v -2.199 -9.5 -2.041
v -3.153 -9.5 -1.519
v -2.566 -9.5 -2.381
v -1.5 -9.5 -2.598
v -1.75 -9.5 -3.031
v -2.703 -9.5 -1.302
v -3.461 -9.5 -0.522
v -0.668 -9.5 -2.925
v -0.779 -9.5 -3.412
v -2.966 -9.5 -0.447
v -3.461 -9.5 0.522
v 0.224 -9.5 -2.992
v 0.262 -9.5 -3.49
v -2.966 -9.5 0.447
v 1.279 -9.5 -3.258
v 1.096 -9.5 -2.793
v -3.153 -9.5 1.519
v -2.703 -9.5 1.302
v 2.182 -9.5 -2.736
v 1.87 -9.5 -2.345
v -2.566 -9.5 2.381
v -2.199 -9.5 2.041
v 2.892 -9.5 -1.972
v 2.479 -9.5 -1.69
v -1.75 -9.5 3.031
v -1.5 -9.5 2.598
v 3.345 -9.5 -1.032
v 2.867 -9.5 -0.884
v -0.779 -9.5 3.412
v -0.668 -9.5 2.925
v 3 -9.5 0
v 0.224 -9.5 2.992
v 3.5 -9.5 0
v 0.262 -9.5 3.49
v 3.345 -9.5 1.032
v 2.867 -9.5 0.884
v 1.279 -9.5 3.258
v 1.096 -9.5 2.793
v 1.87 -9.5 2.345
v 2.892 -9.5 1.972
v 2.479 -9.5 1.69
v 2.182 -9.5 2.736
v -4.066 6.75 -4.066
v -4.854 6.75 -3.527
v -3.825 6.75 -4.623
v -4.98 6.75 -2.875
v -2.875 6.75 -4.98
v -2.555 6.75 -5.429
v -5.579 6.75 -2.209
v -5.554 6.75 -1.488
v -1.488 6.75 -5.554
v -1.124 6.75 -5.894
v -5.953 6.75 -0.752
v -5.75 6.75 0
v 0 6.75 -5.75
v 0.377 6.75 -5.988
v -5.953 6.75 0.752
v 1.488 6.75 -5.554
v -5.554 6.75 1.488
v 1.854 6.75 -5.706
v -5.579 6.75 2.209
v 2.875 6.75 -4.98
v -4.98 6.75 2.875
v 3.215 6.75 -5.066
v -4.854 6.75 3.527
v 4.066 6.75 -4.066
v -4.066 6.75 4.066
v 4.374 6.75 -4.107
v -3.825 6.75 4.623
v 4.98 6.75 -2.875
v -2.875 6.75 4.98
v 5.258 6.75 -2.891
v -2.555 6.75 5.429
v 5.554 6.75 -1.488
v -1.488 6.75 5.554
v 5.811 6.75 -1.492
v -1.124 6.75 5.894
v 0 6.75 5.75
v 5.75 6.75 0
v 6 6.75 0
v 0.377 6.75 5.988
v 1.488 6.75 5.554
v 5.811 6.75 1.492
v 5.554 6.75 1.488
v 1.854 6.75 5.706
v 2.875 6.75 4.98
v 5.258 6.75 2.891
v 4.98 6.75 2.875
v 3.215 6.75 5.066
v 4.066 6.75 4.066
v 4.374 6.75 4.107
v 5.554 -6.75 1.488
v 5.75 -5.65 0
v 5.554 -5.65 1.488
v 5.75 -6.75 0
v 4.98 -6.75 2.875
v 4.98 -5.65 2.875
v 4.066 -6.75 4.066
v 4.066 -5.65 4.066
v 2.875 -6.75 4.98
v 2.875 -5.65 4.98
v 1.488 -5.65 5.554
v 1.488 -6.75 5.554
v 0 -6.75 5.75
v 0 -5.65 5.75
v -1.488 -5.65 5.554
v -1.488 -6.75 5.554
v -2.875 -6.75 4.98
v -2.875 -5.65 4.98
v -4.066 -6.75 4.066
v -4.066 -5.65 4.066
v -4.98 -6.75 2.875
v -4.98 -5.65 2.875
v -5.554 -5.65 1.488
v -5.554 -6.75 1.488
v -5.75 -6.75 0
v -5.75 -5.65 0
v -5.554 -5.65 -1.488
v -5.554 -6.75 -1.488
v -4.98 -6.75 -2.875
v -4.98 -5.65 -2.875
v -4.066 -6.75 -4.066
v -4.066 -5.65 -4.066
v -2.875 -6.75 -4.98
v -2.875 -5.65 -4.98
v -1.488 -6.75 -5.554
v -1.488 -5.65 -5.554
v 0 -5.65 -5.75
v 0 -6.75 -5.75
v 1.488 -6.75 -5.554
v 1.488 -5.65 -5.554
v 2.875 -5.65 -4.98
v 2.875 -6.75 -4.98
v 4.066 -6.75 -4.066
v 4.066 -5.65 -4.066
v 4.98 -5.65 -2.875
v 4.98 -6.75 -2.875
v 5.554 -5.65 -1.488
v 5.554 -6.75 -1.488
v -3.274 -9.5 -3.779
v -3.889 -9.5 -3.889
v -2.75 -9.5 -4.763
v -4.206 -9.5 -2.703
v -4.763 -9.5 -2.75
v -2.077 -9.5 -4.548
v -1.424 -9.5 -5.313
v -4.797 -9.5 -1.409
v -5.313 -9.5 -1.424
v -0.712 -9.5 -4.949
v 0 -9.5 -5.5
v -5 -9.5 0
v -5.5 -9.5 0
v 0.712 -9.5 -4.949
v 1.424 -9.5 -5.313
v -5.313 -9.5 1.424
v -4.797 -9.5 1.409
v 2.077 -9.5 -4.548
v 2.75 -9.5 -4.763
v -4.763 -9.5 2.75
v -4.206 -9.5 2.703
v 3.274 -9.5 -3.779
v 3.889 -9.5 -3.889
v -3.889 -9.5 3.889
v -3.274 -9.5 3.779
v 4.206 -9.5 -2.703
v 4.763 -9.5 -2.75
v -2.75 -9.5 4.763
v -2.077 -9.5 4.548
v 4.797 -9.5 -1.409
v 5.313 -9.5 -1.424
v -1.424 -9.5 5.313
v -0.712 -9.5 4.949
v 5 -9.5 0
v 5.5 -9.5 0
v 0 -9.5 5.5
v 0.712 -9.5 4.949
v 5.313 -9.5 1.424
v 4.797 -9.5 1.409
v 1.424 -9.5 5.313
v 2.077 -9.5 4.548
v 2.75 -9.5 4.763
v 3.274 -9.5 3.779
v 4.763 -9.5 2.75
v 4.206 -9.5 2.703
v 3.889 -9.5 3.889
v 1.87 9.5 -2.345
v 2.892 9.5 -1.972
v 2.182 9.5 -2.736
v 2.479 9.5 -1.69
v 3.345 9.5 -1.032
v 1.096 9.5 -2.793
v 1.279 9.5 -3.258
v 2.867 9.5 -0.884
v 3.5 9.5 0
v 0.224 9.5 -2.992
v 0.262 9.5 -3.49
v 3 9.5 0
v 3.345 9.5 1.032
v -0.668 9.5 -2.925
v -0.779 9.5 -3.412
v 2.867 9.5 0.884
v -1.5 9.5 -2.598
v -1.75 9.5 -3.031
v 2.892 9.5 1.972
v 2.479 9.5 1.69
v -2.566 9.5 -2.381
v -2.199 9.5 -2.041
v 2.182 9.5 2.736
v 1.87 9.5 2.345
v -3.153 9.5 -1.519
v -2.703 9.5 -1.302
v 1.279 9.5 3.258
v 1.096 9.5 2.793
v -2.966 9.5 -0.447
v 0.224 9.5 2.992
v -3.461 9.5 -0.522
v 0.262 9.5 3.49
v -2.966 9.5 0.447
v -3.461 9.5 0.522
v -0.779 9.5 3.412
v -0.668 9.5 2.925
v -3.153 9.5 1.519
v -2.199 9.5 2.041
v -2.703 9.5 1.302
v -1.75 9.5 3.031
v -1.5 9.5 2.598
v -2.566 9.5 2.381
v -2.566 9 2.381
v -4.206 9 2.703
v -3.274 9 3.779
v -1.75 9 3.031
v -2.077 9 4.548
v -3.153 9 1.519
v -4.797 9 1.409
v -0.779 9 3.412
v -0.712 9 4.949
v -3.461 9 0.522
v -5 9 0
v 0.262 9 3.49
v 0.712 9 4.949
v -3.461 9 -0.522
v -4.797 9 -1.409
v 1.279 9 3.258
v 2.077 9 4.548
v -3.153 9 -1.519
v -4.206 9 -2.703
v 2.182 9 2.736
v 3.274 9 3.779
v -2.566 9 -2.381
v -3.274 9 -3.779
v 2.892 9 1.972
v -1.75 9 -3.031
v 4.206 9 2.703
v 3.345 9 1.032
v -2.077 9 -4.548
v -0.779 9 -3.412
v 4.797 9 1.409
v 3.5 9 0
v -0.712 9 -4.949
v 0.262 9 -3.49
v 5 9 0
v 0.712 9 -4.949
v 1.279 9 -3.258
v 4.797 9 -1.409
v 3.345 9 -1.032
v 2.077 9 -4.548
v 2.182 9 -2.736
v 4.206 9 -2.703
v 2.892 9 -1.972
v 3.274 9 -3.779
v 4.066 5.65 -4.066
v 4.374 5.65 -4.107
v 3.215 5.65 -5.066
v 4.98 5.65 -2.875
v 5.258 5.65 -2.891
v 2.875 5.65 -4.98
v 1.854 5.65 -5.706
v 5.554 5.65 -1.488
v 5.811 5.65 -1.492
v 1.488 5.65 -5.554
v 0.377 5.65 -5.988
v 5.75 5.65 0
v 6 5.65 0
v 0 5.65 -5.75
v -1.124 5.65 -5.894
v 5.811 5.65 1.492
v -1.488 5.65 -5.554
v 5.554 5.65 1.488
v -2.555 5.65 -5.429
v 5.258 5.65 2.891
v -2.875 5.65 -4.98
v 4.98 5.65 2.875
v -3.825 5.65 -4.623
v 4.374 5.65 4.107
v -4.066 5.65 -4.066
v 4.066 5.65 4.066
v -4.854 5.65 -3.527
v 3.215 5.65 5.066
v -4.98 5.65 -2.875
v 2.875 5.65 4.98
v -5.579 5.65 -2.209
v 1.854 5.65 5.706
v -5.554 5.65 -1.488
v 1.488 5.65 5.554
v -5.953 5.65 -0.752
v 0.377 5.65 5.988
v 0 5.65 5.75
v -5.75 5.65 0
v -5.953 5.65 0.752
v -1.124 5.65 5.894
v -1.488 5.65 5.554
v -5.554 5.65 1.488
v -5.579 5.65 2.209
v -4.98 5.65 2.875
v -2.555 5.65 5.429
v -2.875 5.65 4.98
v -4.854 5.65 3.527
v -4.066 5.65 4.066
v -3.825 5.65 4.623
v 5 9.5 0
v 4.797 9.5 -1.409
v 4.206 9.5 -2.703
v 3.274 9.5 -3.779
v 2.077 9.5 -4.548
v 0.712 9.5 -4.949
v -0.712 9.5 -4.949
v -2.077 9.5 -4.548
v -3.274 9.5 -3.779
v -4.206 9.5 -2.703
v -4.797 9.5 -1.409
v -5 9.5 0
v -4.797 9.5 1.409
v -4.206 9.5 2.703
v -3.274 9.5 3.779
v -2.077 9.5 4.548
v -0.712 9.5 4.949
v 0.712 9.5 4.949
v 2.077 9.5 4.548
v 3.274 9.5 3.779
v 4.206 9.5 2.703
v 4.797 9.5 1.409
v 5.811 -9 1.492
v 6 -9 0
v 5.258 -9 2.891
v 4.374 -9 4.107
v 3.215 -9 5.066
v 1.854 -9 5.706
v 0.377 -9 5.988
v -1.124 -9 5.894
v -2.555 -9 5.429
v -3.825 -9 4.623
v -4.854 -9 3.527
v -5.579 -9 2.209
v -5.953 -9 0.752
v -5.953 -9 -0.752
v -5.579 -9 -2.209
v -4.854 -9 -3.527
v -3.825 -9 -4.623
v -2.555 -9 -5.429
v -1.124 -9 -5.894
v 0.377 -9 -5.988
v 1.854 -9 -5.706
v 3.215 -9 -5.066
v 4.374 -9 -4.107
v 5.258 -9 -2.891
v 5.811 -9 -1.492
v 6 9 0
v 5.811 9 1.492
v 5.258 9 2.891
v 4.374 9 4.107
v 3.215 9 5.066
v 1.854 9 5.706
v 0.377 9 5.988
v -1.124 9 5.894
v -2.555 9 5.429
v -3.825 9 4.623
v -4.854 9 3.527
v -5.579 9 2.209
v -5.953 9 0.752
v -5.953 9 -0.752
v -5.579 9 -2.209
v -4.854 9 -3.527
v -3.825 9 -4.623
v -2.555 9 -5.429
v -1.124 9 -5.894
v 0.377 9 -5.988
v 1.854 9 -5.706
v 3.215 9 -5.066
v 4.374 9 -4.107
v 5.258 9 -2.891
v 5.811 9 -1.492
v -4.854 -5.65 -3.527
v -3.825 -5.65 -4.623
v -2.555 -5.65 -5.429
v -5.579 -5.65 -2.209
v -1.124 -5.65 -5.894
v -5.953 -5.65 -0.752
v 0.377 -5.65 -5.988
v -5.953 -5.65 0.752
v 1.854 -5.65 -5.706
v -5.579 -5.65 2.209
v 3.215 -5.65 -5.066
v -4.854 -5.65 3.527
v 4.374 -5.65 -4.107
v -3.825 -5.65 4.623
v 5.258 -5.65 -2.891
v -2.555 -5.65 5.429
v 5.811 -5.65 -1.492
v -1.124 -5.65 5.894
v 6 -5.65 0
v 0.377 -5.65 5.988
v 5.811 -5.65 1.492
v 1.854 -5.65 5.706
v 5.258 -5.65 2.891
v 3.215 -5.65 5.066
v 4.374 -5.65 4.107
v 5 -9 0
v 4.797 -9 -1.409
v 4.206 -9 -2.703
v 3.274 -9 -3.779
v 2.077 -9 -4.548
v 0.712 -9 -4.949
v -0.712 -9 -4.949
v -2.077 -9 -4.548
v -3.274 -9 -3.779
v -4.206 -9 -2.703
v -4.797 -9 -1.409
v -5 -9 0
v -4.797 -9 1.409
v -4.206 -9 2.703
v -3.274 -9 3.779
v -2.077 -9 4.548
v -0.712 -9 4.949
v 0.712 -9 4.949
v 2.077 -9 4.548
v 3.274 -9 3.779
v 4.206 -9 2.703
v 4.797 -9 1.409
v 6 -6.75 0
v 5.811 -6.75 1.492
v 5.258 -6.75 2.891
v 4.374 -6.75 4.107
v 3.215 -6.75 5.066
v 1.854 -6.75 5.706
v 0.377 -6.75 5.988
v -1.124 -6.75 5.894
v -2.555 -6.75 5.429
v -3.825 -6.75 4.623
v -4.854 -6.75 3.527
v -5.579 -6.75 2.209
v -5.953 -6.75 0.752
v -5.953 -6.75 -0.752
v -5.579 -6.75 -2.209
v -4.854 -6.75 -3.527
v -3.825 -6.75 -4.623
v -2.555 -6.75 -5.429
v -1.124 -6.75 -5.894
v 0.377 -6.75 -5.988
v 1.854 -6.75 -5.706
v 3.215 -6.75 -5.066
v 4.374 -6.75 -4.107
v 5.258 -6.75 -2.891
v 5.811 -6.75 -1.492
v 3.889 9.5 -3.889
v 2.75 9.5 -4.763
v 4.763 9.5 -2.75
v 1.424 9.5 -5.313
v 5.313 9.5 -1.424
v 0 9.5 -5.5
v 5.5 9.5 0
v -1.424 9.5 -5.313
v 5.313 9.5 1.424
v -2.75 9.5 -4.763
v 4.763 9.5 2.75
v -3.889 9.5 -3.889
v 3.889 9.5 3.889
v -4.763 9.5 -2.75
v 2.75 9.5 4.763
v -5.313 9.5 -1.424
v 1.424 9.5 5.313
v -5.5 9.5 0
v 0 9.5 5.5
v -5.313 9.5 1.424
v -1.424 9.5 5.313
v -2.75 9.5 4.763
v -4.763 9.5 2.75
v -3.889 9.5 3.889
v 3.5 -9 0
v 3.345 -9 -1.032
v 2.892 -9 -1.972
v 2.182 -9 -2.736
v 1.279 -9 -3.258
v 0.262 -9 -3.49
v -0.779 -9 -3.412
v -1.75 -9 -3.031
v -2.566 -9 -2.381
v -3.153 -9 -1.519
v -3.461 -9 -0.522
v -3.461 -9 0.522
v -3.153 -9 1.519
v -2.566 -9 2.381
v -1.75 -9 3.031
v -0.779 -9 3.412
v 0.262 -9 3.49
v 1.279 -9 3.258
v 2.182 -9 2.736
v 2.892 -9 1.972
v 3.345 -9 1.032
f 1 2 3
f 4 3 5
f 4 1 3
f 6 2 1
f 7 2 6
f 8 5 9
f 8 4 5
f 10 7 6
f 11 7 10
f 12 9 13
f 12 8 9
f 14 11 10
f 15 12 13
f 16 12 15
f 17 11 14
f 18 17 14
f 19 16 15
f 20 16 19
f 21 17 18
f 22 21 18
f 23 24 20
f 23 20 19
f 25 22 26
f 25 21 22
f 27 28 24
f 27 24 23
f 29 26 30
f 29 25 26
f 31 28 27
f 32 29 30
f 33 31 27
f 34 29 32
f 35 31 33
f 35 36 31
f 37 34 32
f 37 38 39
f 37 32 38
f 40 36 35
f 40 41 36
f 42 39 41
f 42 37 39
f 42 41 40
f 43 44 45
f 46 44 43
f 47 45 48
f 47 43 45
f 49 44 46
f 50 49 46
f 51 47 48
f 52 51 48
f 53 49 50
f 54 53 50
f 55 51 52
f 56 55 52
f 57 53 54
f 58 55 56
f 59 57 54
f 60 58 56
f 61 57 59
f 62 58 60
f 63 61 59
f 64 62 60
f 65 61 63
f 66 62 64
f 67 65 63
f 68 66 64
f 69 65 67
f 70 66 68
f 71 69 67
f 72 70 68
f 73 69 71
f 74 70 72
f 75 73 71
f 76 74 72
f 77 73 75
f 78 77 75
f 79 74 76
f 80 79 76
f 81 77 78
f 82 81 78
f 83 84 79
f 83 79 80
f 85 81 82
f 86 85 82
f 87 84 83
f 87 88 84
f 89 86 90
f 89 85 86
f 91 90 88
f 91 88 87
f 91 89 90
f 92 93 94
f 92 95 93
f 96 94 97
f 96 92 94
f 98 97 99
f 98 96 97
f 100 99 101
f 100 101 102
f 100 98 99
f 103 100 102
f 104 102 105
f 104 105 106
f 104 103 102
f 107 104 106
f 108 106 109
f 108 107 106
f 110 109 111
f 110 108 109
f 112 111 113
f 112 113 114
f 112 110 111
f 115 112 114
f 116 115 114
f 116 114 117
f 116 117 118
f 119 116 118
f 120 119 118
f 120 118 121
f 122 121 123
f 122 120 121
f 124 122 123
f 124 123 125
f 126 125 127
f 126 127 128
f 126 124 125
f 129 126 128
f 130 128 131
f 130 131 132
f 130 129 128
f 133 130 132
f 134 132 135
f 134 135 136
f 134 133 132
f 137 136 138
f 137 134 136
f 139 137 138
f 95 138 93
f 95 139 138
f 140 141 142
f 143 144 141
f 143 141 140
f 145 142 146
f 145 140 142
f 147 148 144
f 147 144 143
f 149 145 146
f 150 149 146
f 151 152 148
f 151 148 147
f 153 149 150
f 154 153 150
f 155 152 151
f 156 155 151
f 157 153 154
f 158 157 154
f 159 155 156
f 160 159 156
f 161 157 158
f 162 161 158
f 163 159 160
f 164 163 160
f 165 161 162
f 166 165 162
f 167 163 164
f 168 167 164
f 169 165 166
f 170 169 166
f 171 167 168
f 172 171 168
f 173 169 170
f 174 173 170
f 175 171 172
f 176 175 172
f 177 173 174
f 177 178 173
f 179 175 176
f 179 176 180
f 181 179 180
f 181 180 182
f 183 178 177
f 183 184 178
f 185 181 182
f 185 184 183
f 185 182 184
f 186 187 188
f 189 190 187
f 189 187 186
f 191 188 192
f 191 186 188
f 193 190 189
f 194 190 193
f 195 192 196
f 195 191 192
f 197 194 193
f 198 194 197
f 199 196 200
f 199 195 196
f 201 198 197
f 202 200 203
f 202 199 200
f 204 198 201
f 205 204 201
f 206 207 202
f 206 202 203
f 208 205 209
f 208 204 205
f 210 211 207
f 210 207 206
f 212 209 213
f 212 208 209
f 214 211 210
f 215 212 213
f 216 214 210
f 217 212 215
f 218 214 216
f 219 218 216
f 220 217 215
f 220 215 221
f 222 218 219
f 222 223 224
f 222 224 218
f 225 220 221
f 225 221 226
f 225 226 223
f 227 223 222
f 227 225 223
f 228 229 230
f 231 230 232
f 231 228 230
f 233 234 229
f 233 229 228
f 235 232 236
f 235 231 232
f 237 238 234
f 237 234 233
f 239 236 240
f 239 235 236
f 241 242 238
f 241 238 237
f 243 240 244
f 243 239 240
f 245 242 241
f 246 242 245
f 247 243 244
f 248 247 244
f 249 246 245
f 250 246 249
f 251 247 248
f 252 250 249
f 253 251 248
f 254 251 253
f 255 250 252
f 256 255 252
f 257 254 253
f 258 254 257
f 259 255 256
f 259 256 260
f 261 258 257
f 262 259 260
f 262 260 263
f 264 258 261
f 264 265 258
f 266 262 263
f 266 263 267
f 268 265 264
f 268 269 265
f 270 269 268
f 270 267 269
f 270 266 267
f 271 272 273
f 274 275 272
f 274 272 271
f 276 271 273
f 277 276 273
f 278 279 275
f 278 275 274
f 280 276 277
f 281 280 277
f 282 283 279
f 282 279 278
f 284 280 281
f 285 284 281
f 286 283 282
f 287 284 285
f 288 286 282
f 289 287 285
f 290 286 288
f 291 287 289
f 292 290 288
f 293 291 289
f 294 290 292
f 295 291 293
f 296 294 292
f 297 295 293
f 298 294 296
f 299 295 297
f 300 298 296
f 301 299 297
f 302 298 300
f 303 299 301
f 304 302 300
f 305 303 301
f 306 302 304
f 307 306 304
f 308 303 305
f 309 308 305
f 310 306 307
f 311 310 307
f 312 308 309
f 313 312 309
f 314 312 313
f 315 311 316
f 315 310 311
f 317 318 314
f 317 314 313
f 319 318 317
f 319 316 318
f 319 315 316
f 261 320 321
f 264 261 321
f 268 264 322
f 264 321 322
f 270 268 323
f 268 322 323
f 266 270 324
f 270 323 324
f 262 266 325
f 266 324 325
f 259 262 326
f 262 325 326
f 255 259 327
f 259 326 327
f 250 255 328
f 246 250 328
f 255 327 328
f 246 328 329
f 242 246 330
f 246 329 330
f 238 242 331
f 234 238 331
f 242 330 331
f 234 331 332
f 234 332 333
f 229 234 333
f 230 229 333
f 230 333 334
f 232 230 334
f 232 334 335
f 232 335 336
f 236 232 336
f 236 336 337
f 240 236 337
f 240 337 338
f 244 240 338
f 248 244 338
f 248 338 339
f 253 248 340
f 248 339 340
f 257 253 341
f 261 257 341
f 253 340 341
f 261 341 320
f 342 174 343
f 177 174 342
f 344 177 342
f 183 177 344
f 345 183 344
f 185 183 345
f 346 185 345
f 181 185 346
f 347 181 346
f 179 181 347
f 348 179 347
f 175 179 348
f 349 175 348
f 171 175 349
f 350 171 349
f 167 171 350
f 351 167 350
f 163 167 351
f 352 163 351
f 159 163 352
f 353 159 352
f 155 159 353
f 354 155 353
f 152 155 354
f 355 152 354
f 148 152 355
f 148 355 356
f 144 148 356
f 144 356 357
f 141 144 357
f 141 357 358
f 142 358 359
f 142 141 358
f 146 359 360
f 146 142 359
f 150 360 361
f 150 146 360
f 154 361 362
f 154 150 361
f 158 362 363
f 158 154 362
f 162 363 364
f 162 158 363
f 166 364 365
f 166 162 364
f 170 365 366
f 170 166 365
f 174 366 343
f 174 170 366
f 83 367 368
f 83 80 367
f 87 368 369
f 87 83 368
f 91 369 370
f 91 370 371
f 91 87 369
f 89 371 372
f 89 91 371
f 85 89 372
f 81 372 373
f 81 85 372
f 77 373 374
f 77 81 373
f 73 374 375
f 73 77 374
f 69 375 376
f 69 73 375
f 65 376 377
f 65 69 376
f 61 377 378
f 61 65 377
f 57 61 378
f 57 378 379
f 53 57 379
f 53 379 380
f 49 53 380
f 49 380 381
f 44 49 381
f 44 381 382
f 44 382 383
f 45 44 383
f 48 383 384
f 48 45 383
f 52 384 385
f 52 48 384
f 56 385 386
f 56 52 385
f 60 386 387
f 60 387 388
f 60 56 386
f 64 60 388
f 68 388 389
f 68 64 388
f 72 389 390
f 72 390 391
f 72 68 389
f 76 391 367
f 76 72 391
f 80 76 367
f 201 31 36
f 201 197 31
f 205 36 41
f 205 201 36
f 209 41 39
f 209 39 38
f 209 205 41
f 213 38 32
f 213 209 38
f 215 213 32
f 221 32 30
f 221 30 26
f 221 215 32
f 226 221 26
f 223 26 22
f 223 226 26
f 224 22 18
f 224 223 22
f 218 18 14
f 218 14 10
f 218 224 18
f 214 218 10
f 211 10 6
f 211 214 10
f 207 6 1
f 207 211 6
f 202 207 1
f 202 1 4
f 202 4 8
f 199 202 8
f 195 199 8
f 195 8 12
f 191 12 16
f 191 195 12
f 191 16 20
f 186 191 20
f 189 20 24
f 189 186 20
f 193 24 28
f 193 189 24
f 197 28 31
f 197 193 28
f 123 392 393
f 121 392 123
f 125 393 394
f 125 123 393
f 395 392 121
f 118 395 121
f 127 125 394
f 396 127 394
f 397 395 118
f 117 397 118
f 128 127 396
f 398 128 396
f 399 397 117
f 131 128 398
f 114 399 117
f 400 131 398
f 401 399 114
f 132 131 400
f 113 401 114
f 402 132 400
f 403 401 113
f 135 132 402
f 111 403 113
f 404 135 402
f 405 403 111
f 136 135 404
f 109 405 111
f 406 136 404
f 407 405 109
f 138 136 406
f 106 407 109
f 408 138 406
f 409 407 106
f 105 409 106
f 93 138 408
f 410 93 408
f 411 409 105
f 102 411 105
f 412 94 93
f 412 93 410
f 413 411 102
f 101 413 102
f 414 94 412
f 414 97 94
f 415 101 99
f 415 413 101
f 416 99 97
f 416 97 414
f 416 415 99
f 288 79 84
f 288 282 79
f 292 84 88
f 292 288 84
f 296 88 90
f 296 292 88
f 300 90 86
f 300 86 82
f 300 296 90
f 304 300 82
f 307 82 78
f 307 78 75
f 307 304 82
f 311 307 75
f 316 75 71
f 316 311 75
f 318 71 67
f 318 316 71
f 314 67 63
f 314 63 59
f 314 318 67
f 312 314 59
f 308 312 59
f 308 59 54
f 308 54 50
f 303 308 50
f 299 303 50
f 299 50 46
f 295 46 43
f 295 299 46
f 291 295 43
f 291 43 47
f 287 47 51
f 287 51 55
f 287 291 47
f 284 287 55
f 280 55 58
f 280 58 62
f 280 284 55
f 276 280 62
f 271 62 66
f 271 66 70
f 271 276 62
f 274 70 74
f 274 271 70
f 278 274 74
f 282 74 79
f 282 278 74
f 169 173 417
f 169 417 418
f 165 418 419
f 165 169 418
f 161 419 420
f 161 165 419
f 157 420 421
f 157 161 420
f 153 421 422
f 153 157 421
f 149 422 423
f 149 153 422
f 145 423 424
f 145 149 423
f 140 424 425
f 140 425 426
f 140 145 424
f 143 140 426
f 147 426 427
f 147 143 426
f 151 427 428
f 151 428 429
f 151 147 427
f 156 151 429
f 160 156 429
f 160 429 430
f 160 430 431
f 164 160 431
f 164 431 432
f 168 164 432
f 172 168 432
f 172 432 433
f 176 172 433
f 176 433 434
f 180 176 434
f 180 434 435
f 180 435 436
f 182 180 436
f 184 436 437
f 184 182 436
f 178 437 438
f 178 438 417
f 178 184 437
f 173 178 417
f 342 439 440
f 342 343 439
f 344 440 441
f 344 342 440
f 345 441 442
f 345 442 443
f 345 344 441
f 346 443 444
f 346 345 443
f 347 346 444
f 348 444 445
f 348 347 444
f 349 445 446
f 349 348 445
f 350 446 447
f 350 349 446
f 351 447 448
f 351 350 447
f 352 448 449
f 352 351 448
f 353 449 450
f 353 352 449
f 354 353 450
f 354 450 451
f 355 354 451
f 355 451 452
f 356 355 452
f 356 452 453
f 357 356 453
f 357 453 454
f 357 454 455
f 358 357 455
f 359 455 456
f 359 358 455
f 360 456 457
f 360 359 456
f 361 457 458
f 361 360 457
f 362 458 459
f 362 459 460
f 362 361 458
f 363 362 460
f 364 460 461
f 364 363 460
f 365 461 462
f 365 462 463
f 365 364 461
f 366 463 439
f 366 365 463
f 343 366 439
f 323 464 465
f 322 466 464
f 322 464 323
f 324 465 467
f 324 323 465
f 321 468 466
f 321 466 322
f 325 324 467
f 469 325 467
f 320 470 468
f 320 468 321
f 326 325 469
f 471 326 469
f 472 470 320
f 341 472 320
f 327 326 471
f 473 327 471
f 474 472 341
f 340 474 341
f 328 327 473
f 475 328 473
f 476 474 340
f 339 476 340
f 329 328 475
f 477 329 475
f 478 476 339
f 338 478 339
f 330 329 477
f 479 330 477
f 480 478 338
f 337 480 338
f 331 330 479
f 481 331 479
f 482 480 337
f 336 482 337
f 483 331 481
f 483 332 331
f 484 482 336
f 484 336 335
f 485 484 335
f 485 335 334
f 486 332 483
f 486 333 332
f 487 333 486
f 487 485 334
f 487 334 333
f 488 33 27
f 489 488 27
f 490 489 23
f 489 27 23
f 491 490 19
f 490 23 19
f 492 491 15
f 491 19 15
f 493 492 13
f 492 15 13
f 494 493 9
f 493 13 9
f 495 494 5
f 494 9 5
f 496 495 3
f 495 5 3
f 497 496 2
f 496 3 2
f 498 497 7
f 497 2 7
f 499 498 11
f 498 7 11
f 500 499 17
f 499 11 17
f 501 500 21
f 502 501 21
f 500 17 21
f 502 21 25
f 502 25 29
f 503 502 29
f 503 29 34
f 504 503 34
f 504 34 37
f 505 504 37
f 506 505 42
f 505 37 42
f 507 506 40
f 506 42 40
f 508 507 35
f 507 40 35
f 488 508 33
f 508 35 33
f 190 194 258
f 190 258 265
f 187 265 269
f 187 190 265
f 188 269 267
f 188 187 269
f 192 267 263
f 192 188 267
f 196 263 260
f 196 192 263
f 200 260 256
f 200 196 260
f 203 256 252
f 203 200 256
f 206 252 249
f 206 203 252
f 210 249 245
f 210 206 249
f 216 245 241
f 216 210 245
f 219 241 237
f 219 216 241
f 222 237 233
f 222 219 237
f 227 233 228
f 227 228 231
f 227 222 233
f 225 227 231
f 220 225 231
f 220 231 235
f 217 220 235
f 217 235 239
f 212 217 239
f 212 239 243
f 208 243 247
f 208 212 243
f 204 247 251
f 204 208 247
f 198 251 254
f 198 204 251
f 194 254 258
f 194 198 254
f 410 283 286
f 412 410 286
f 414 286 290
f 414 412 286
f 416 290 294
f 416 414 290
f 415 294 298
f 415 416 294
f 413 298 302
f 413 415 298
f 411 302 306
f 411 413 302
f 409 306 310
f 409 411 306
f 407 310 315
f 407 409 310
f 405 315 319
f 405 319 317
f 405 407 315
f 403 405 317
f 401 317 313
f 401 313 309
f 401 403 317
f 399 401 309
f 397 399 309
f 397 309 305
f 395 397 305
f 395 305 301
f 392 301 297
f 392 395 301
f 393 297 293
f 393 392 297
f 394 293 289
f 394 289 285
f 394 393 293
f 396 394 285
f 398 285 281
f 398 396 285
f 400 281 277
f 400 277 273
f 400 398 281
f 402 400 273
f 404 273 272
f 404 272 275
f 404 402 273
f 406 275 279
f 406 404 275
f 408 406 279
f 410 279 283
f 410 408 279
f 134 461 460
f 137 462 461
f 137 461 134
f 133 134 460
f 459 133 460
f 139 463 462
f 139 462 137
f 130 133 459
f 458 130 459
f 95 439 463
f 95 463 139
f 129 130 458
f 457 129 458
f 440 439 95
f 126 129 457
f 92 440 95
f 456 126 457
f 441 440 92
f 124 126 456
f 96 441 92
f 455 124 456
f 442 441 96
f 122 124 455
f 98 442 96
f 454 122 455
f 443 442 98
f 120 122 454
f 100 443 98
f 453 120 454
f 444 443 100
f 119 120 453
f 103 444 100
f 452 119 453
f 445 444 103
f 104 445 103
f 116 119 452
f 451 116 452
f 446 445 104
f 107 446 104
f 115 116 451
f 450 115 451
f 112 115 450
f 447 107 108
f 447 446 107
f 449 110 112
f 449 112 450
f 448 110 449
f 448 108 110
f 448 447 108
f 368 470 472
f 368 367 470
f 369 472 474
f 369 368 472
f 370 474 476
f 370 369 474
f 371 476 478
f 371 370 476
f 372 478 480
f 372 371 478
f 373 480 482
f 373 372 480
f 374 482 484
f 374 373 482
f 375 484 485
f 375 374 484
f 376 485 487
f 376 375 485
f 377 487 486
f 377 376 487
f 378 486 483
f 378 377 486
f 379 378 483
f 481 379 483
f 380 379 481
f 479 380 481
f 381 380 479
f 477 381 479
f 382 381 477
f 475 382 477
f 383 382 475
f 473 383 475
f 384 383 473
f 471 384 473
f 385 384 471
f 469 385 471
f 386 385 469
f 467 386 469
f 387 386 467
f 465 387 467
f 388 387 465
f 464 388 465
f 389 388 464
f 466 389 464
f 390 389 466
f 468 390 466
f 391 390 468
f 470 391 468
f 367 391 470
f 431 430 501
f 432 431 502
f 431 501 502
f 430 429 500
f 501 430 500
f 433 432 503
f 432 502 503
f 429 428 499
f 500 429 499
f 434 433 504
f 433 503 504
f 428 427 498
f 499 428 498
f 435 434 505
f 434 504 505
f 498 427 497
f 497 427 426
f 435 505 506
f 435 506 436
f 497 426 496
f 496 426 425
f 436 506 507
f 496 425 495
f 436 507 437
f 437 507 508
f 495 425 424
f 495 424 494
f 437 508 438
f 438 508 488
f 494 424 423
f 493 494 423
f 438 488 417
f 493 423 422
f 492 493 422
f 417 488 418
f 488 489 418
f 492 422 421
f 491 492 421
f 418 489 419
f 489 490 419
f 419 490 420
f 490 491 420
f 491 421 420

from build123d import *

# Parameters (mm, degrees)
SKETCH2_R          = 5
SKETCH2_R_2        = 3.5
CUT_EXTRUDE1_DEPTH = 0.5


with BuildPart() as part:
    # Sketch1 → Revolve1 (revolve)
    with BuildSketch(Plane.XY):
        Polygon((3, -9.5), (3, 9.5), (5.5, 9.5), (6, 9), (6, 6.75), (5.75, 6.75), (5.75, 5.65), (6, 5.65), (6, -5.65), (5.75, -5.65), (5.75, -6.75), (6, -6.75), (6, -9), (5.5, -9.5), align=None)
    revolve(axis=Axis((0, 9.5, 0), (0, -1, 0)))

    # Sketch2 → Cut-Extrude1 (cut)
    with BuildSketch(Plane(origin=(0, 9.5, 0), x_dir=(1, 0, 0), z_dir=(0, 1, 0))):
        Circle(SKETCH2_R)
        Circle(SKETCH2_R_2, mode=Mode.SUBTRACT)
    cut_extrude1 = extrude(amount=-CUT_EXTRUDE1_DEPTH, mode=Mode.SUBTRACT)

    # Mirror1: Cut-Extrude1 across plane
    add(cut_extrude1.mirror(Plane.ZX), mode=Mode.SUBTRACT)


solid = part.part
